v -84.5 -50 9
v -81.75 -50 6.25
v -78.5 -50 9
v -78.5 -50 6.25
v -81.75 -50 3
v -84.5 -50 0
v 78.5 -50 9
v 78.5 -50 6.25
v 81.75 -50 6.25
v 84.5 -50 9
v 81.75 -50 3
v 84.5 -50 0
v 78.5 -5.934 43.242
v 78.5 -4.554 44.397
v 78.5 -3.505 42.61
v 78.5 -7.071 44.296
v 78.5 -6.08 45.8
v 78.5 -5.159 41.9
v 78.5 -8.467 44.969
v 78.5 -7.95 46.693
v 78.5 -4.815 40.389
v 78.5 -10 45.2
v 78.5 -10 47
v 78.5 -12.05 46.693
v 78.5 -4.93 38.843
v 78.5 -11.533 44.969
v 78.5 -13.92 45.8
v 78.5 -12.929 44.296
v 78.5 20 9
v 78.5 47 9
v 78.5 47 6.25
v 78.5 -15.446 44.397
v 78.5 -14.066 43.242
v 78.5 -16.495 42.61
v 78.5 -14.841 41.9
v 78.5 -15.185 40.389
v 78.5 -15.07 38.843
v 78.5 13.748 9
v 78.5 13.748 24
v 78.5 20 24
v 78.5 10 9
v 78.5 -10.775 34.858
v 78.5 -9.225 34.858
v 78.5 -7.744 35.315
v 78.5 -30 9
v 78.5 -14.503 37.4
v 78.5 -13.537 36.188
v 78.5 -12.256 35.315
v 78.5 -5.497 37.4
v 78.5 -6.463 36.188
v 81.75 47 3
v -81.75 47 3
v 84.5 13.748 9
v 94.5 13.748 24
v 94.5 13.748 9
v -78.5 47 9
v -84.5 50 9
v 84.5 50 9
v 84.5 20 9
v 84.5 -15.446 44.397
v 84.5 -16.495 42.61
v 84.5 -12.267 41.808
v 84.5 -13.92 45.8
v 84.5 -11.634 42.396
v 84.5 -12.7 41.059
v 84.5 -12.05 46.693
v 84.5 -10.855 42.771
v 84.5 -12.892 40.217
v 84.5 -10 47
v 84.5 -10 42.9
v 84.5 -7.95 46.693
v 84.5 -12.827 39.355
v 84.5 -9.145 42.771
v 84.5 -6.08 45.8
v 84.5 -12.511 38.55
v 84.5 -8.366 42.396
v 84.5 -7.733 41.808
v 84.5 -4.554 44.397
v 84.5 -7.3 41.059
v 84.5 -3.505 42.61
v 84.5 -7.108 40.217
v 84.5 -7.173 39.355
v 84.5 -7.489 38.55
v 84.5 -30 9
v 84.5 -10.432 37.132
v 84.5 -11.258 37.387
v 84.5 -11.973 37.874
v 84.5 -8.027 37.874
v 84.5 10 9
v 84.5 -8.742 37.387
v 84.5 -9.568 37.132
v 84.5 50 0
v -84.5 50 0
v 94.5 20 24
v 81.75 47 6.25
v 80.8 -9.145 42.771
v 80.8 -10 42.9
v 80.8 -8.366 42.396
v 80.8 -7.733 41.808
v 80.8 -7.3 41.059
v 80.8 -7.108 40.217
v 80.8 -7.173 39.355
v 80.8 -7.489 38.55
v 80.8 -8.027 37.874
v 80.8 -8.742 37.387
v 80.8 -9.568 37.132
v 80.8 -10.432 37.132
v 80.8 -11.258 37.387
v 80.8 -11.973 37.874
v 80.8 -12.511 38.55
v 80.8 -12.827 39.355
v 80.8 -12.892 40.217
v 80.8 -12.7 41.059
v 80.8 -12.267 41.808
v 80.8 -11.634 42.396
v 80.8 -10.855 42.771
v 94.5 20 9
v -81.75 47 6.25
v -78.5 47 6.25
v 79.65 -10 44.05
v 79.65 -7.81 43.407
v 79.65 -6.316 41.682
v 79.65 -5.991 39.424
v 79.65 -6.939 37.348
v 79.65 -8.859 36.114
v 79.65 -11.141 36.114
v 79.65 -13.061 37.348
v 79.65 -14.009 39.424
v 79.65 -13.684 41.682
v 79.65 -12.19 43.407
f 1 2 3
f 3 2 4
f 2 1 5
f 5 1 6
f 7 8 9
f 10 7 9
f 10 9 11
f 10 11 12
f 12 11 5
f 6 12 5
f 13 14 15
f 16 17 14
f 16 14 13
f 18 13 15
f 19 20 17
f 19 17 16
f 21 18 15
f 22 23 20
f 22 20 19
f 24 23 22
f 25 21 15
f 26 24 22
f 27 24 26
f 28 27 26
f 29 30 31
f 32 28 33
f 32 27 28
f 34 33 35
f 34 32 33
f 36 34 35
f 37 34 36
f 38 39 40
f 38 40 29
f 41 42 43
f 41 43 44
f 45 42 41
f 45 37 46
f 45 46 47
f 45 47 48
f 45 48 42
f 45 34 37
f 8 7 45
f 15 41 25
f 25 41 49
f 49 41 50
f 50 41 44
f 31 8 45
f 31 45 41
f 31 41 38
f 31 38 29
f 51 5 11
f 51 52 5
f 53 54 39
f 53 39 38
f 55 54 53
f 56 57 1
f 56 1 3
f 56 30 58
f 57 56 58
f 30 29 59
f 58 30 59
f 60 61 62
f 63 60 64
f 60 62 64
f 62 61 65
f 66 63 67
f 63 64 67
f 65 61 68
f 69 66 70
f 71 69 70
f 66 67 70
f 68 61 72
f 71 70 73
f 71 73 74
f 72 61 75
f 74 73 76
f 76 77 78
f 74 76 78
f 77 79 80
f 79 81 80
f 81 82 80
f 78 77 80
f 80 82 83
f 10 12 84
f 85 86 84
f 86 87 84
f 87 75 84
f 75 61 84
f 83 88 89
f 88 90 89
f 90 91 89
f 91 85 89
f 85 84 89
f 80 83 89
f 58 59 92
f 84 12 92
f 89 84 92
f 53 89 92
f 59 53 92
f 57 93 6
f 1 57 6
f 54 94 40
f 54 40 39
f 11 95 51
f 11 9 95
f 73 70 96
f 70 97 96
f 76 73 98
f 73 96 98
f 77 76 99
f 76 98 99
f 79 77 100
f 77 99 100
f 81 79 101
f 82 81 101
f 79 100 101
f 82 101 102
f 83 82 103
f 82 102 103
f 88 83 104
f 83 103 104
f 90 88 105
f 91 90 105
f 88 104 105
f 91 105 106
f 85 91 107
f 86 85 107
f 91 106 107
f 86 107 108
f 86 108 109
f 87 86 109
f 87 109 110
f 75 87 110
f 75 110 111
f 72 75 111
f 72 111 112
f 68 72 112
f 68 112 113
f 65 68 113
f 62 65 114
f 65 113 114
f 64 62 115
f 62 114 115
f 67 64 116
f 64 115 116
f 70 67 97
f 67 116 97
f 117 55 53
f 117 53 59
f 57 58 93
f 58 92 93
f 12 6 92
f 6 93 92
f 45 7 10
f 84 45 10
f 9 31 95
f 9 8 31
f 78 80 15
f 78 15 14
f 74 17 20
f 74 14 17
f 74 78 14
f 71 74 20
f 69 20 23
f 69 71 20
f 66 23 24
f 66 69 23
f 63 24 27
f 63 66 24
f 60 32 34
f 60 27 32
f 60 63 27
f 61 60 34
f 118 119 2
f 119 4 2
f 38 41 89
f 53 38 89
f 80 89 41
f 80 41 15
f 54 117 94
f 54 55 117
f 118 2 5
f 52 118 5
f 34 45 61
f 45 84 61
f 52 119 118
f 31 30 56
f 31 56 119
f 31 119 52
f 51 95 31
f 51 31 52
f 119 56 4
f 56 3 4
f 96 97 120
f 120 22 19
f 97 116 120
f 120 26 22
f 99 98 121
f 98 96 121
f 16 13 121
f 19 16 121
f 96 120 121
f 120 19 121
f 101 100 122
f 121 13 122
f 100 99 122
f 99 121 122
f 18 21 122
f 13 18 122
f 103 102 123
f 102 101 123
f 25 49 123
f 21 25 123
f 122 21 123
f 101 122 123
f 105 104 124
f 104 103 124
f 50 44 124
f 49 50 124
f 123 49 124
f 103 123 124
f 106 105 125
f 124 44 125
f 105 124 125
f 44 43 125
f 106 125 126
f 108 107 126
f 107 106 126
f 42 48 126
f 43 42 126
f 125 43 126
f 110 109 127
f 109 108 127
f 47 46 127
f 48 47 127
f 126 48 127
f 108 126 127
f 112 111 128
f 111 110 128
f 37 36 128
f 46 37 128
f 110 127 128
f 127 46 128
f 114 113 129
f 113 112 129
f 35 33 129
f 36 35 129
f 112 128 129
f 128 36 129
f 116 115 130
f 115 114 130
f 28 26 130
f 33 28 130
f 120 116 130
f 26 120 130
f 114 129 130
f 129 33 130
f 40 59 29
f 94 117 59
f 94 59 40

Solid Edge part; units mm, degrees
sketch "Sketch1" plane through (0, 0, 0) normal (0, 0, 1) x (1, 0, 0)
  line L0 (-84.5, -50) -> (84.5, -50)
  line L1 (84.5, -50) -> (84.5, 50)
  line L2 (84.5, 50) -> (-84.5, 50)
  line L3 (-84.5, 50) -> (-84.5, -50)
  dimension "D1" = 169
  dimension "D2" = 100
extrude "Protrusion1" add sketch "Sketch1" along normal blind 3
sketch "Sketch2" plane through (0, -50, 1.5) normal (0, -1, 0) x (1, 0, 0)
  line L0 (-84.5, 1.5) -> (-84.5, 7.5)
  line L1 (-84.5, 7.5) -> (-78.5, 7.5)
  line L2 (-78.5, 7.5) -> (-78.5, 4.75)
  line L3 (-78.5, 4.75) -> (-81.75, 4.75)
  line L4 (-81.75, 4.75) -> (-81.75, 1.5)
  line L5 (-81.75, 1.5) -> (-84.5, 1.5)
  line L6 (84.5, 1.5) -> (84.5, 7.5)
  line L7 (84.5, 7.5) -> (78.5, 7.5)
  line L8 (78.5, 7.5) -> (78.5, 4.75)
  line L9 (78.5, 4.75) -> (81.75, 4.75)
  line L10 (81.75, 4.75) -> (81.75, 1.5)
  line L11 (81.75, 1.5) -> (84.5, 1.5)
  dimension "D1" = 2.75
  dimension "D2" = 6
  dimension "D3" = 2.75
  dimension "D4" = 6
  dimension "D5" = 3.25
  dimension "D6" = 6
  dimension "D7" = 3.25
  dimension "D8" = 6
extrude "Extrusionsausschnitt_1" add sketch "Sketch2" against normal blind 100
sketch "Sketch3" plane through (0, 50, 4.5) normal (0, 1, 0) x (-1, 0, 0)
  line L0 (84.5, -4.5) -> (-84.5, -4.5)
  line L1 (-84.5, -4.5) -> (-84.5, 4.5)
  line L2 (-84.5, 4.5) -> (84.5, 4.5)
  line L3 (84.5, 4.5) -> (84.5, -4.5)
extrude "Extrusionsausprägung_3" add sketch "Sketch3" against normal blind 3
sketch "Sketch4" plane through (84.5, 0, 4.5) normal (1, 0, 0) x (0, 1, 0)
  line L0 (-30, 4.5) -> (-16.4953, 38.1099)
  line L1 (10, 4.5) -> (-3.5047, 38.1099)
  line L2 (-30, 4.5) -> (10, 4.5)
  arc A0 (-16.4953, 38.1099) -> (-3.5047, 38.1099) centre (-10, 35.5) cw
  dimension "D1" = 14
  dimension "D2" = 60
  dimension "D3" = 40
  dimension "D4" = 40
extrude "Extrusionsausprägung_4" add sketch "Sketch4" against normal blind 6
hole "Bohrung_2" at (78.5, -10, 40) direction (1, 0, 0) diameter 5.8 end up to next countersink diameter 10.4 countersink angle 90
sketch "Sketch5" plane through (84.5, 0, 23.5) normal (1, 0, 0) x (0, 1, 0)
  line L0 (13.7478, -14.5) -> (20, -14.5)
  line L1 (20, -14.5) -> (20, 0.5)
  line L2 (20, 0.5) -> (13.7478, 0.5)
  line L3 (13.7478, 0.5) -> (13.7478, -14.5)
  dimension "D1" = 6.2522
  dimension "D2" = 30
  dimension "D3" = 15
extrude "Extrusionsausprägung_5" add sketch "Sketch5" against normal blind 6 and the other way blind 10
